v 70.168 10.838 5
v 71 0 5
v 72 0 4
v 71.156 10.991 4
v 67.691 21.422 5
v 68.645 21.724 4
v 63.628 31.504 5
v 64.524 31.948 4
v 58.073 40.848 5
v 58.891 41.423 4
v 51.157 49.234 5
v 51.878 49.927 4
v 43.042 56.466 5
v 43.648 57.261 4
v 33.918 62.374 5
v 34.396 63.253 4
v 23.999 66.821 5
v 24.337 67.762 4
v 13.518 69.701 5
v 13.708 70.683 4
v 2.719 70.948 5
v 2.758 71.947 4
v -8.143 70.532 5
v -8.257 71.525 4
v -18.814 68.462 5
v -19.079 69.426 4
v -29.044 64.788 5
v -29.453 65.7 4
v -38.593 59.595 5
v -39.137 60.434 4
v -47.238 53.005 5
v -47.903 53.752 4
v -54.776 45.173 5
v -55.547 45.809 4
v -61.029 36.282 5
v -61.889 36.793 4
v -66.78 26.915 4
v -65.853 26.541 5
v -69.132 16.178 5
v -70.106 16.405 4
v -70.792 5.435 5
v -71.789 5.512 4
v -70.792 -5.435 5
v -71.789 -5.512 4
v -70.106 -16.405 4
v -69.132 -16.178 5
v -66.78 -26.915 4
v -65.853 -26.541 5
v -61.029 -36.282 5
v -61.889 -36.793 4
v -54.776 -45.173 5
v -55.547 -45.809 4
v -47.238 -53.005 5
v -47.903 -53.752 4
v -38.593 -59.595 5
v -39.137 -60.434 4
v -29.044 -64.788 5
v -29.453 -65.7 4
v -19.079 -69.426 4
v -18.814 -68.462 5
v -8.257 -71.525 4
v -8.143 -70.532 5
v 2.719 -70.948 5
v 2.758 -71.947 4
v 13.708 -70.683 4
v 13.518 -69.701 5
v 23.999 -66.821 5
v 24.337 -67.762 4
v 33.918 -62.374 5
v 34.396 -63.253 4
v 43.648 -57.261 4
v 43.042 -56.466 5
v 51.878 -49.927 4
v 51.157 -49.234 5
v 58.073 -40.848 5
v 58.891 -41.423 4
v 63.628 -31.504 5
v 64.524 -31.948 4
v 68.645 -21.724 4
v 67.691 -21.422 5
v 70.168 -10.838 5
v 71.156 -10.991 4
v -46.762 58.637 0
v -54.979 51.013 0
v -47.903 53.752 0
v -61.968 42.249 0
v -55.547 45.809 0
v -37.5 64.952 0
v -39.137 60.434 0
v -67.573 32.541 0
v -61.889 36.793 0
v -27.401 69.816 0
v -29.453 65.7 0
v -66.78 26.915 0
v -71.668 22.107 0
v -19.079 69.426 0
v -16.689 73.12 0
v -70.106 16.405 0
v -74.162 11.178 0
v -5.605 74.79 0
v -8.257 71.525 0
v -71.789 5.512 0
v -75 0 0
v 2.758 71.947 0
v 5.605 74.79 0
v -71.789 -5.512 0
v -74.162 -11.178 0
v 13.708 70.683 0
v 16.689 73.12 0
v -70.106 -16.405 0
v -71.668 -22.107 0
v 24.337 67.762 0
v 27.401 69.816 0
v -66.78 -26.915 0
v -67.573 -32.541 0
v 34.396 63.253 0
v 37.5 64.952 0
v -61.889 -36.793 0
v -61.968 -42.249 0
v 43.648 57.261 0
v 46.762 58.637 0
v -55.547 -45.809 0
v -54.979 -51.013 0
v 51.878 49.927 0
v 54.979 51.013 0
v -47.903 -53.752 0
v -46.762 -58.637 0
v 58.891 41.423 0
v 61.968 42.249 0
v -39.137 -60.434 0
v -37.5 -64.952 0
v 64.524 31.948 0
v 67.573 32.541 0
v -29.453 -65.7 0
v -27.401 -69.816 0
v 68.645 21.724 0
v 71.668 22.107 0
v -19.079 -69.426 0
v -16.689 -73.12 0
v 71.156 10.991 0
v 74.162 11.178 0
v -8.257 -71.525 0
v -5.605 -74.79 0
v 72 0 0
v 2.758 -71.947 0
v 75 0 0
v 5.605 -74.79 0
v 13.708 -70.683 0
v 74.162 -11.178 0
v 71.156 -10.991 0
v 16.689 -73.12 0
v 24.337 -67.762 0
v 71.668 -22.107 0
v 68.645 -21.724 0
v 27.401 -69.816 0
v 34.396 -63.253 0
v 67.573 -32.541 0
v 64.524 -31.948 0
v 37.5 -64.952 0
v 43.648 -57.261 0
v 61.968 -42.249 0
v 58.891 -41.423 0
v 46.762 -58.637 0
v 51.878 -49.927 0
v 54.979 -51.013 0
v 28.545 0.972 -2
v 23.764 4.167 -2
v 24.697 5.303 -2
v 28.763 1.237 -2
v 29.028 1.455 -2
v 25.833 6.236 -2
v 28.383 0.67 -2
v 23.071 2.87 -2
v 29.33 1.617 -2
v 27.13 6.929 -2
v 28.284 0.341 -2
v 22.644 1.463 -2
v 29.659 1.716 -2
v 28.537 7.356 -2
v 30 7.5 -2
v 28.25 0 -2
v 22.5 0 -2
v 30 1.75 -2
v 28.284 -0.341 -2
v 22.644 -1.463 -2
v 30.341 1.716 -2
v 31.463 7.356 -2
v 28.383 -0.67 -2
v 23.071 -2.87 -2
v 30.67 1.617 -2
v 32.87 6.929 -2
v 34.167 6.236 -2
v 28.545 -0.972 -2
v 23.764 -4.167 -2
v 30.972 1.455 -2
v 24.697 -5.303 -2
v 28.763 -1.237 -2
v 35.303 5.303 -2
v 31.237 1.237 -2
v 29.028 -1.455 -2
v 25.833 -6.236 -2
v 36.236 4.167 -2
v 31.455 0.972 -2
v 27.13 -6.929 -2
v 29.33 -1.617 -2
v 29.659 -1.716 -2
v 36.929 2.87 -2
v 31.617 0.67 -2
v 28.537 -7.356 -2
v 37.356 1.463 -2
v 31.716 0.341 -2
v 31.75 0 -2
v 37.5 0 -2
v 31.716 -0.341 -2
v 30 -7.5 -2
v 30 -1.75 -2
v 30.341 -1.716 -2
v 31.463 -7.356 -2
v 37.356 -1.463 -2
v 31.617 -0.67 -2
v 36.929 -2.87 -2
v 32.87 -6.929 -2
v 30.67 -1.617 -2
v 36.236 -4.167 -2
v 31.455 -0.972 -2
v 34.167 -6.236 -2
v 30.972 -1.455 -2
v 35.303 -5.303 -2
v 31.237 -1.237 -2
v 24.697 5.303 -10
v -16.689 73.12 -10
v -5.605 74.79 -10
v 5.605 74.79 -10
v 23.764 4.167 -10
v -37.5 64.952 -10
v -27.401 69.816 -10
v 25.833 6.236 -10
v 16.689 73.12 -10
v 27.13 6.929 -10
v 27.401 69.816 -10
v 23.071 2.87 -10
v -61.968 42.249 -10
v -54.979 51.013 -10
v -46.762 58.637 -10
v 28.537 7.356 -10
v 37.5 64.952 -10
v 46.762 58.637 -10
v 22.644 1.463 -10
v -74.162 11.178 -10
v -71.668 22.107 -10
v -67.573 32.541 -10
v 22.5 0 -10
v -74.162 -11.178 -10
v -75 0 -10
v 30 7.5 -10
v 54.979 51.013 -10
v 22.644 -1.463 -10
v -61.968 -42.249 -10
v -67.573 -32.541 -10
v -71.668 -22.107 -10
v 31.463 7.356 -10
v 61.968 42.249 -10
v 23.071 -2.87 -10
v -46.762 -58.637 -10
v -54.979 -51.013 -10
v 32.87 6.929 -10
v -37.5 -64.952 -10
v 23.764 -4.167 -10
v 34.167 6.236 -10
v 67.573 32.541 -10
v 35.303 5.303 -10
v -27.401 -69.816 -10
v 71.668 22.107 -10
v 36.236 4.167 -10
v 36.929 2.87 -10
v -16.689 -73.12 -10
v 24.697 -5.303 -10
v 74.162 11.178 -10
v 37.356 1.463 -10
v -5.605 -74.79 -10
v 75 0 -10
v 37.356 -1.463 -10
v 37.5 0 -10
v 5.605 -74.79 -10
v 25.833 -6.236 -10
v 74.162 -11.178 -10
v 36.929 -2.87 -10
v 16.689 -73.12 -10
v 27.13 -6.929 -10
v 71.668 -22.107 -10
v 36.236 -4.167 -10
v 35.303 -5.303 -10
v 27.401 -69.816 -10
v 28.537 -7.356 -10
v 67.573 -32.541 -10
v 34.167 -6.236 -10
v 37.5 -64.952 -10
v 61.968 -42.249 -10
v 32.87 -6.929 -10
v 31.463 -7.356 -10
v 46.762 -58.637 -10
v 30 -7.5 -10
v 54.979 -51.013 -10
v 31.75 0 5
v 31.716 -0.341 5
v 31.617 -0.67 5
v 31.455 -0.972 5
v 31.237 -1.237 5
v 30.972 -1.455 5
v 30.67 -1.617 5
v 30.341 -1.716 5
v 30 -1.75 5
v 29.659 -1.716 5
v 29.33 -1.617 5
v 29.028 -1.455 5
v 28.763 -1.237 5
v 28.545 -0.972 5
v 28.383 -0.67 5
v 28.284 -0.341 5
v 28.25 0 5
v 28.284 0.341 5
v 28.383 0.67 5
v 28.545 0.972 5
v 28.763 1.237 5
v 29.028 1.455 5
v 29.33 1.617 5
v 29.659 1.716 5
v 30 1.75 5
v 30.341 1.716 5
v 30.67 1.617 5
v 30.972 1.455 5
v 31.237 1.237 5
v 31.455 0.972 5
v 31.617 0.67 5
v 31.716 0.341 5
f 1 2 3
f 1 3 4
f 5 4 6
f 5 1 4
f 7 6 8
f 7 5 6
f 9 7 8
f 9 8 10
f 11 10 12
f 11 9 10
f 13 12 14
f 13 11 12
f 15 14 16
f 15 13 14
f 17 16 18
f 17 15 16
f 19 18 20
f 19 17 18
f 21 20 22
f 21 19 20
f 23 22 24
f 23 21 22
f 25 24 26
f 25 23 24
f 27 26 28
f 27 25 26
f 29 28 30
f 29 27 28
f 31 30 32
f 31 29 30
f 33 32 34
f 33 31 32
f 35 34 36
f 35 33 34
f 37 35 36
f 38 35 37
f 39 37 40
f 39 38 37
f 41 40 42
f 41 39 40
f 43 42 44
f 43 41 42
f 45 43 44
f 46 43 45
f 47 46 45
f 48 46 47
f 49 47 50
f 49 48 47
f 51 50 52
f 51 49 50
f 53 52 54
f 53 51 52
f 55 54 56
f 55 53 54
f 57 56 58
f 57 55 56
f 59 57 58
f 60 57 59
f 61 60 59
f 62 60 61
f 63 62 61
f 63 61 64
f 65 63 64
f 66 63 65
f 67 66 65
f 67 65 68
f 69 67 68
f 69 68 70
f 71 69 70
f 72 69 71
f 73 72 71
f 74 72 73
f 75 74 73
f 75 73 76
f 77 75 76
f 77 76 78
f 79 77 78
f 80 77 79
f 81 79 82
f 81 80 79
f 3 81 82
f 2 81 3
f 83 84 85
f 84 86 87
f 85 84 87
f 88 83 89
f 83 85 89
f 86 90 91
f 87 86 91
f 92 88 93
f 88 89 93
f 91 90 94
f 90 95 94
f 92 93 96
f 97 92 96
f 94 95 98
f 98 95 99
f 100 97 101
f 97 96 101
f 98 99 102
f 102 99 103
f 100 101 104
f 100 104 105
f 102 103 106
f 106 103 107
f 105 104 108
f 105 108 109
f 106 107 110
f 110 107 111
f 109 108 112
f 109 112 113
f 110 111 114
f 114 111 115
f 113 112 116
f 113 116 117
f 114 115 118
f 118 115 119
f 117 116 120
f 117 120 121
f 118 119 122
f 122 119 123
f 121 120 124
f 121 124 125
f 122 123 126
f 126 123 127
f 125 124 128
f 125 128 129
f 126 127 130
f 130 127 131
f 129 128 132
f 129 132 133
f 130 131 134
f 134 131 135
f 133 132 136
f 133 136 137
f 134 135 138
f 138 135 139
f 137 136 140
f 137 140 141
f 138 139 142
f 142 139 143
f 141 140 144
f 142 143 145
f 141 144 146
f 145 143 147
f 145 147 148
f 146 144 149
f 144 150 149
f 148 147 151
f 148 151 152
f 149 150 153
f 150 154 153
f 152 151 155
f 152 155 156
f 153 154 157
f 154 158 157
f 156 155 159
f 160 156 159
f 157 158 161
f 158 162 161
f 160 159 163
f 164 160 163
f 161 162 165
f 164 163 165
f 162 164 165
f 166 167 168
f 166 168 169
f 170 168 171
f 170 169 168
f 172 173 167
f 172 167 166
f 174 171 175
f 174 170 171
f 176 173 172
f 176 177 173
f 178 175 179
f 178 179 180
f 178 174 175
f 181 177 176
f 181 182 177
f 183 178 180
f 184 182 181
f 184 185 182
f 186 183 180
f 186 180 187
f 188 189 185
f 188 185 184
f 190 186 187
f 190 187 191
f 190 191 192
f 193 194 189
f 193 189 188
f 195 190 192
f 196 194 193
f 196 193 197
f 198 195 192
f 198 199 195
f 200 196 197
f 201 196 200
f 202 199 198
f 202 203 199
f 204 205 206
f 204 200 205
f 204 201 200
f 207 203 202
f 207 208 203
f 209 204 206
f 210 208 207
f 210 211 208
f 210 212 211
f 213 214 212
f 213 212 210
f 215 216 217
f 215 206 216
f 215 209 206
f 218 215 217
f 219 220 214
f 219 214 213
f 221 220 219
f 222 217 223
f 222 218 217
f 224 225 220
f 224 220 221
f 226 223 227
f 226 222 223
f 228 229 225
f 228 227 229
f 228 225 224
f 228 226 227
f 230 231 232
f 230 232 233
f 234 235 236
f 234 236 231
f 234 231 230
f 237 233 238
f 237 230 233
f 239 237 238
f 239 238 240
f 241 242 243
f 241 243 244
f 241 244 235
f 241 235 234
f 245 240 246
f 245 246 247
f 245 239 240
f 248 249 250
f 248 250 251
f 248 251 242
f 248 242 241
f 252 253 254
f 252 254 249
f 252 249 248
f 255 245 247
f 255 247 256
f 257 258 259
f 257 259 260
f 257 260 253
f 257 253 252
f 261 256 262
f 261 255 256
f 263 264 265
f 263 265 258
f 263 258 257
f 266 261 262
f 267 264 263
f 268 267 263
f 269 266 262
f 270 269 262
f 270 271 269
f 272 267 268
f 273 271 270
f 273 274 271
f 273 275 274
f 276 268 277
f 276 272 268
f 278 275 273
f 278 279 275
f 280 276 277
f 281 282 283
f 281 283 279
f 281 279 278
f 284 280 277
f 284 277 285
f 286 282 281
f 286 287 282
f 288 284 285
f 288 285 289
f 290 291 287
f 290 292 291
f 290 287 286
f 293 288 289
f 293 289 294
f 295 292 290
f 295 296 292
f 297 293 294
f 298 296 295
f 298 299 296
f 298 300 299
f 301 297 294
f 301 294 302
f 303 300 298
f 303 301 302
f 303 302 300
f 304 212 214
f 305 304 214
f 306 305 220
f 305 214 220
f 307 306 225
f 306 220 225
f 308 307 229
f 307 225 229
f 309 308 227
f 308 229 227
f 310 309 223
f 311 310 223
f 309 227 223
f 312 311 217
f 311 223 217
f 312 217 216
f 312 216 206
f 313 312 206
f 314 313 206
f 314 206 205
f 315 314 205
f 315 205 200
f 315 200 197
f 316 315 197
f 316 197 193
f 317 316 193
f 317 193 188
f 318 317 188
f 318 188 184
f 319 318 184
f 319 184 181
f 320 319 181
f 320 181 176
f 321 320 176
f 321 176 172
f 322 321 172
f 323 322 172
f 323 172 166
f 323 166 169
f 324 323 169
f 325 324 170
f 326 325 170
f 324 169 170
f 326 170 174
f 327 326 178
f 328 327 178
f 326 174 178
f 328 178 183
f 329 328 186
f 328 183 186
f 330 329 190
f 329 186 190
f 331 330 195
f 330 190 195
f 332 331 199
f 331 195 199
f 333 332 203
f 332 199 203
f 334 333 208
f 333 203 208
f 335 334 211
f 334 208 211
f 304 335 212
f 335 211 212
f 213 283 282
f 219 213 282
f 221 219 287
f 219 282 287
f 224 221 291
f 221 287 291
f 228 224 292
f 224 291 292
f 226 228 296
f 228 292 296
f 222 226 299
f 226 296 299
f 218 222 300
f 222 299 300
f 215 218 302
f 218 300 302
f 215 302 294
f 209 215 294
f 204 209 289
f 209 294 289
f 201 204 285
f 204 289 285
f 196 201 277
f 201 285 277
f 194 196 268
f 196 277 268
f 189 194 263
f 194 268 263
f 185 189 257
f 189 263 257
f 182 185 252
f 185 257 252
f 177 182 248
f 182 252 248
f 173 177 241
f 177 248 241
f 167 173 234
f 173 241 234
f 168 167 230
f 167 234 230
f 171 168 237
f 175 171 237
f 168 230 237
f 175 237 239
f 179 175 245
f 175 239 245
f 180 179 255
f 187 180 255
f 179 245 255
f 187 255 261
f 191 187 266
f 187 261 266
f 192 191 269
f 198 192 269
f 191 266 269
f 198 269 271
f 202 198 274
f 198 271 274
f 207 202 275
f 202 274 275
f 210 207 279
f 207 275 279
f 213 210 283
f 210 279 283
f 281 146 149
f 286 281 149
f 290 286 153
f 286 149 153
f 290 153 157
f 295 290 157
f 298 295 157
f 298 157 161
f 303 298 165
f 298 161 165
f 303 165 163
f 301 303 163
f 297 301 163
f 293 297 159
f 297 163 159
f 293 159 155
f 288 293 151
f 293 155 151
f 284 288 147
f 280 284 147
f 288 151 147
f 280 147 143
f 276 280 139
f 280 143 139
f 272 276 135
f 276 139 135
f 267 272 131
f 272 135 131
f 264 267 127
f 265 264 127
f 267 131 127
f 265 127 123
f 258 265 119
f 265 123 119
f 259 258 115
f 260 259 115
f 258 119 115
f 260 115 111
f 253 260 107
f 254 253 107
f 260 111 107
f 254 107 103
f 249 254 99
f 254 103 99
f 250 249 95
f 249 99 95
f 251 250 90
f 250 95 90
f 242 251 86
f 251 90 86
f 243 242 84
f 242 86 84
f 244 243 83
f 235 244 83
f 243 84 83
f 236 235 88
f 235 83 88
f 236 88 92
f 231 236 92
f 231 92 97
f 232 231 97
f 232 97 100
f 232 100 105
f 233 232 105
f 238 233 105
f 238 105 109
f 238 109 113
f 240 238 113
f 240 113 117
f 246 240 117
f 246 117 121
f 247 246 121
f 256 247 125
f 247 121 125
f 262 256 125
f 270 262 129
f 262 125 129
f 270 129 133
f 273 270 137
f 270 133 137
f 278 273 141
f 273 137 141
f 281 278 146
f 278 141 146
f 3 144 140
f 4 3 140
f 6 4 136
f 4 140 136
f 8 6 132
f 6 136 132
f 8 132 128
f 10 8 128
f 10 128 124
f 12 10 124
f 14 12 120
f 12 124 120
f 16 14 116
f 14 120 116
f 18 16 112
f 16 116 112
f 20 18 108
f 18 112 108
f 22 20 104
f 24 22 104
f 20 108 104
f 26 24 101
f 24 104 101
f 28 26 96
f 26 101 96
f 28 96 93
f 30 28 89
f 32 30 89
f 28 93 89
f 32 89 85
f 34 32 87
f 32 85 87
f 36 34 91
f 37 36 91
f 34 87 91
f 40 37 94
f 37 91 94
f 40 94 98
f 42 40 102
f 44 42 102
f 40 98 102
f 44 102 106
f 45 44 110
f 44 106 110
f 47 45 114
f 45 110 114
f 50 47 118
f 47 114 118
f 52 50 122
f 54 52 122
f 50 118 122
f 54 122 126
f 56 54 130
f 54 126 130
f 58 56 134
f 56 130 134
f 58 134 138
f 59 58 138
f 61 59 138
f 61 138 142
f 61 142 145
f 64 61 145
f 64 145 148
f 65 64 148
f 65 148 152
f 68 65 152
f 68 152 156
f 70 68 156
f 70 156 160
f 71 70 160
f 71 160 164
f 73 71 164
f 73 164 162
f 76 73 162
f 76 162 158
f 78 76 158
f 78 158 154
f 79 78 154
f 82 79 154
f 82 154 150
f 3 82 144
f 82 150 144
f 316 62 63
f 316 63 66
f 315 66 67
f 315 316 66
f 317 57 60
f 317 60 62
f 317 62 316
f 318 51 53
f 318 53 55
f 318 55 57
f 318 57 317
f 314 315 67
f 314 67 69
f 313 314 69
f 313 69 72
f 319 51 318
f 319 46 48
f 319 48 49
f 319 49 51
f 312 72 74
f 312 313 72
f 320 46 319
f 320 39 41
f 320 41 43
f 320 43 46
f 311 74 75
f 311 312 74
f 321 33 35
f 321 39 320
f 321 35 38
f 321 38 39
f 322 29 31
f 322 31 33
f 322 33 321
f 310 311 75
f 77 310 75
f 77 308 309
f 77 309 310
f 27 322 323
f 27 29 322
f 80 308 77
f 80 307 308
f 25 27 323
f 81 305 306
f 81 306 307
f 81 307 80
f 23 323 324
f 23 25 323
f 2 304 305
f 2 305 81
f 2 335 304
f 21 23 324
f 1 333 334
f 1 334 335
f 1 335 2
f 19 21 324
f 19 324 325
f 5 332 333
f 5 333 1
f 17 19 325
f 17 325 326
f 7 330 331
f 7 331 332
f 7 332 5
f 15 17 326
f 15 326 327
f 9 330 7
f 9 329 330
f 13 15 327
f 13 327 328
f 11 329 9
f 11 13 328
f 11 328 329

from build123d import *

# Parameters (mm, degrees)
SKETCH_R        = 72
PAD_DEPTH       = 5
SKETCH001_R     = 75
PAD001_DEPTH    = 10
CHAMFER_SIZE    = 1
SKETCH002_R     = 1.75
POCKET_DEPTH    = 15.001
SKETCH003_R     = 7.5
POCKET001_DEPTH = 8


with BuildPart() as part:
    # Sketch → Pad (new body)
    with BuildSketch(Plane.XY):
        Circle(SKETCH_R)
    extrude(amount=PAD_DEPTH)

    # Sketch001 (on Face2 of Pad) → Pad001 (join)
    with BuildSketch(Plane(origin=(0, 0, 0), x_dir=(1, 0, 0), z_dir=(0, 0, -1))):
        Circle(SKETCH001_R)
    extrude(amount=PAD001_DEPTH)

    # Chamfer
    chamfer_edges = [part.edges().sort_by_distance(p)[0] for p in [
        (-72, 0, 5),
    ]]
    chamfer(chamfer_edges, length=CHAMFER_SIZE)

    # Sketch002 (on Face6 of Chamfer) → Pocket (cut, through all)
    with BuildSketch(Plane(origin=(0, 0, -10), x_dir=(1, 0, 0), z_dir=(0, 0, -1))):
        with Locations((30, 0)):
            Circle(SKETCH002_R)
    extrude(amount=-POCKET_DEPTH, mode=Mode.SUBTRACT)

    # Sketch003 (on Face7 of Pocket) → Pocket001 (cut)
    with BuildSketch(Plane(origin=(0, 0, -10), x_dir=(1, 0, 0), z_dir=(0, 0, -1))):
        with Locations((30, 0)):
            Circle(SKETCH003_R)
    extrude(amount=-POCKET001_DEPTH, mode=Mode.SUBTRACT)


solid = part.part
